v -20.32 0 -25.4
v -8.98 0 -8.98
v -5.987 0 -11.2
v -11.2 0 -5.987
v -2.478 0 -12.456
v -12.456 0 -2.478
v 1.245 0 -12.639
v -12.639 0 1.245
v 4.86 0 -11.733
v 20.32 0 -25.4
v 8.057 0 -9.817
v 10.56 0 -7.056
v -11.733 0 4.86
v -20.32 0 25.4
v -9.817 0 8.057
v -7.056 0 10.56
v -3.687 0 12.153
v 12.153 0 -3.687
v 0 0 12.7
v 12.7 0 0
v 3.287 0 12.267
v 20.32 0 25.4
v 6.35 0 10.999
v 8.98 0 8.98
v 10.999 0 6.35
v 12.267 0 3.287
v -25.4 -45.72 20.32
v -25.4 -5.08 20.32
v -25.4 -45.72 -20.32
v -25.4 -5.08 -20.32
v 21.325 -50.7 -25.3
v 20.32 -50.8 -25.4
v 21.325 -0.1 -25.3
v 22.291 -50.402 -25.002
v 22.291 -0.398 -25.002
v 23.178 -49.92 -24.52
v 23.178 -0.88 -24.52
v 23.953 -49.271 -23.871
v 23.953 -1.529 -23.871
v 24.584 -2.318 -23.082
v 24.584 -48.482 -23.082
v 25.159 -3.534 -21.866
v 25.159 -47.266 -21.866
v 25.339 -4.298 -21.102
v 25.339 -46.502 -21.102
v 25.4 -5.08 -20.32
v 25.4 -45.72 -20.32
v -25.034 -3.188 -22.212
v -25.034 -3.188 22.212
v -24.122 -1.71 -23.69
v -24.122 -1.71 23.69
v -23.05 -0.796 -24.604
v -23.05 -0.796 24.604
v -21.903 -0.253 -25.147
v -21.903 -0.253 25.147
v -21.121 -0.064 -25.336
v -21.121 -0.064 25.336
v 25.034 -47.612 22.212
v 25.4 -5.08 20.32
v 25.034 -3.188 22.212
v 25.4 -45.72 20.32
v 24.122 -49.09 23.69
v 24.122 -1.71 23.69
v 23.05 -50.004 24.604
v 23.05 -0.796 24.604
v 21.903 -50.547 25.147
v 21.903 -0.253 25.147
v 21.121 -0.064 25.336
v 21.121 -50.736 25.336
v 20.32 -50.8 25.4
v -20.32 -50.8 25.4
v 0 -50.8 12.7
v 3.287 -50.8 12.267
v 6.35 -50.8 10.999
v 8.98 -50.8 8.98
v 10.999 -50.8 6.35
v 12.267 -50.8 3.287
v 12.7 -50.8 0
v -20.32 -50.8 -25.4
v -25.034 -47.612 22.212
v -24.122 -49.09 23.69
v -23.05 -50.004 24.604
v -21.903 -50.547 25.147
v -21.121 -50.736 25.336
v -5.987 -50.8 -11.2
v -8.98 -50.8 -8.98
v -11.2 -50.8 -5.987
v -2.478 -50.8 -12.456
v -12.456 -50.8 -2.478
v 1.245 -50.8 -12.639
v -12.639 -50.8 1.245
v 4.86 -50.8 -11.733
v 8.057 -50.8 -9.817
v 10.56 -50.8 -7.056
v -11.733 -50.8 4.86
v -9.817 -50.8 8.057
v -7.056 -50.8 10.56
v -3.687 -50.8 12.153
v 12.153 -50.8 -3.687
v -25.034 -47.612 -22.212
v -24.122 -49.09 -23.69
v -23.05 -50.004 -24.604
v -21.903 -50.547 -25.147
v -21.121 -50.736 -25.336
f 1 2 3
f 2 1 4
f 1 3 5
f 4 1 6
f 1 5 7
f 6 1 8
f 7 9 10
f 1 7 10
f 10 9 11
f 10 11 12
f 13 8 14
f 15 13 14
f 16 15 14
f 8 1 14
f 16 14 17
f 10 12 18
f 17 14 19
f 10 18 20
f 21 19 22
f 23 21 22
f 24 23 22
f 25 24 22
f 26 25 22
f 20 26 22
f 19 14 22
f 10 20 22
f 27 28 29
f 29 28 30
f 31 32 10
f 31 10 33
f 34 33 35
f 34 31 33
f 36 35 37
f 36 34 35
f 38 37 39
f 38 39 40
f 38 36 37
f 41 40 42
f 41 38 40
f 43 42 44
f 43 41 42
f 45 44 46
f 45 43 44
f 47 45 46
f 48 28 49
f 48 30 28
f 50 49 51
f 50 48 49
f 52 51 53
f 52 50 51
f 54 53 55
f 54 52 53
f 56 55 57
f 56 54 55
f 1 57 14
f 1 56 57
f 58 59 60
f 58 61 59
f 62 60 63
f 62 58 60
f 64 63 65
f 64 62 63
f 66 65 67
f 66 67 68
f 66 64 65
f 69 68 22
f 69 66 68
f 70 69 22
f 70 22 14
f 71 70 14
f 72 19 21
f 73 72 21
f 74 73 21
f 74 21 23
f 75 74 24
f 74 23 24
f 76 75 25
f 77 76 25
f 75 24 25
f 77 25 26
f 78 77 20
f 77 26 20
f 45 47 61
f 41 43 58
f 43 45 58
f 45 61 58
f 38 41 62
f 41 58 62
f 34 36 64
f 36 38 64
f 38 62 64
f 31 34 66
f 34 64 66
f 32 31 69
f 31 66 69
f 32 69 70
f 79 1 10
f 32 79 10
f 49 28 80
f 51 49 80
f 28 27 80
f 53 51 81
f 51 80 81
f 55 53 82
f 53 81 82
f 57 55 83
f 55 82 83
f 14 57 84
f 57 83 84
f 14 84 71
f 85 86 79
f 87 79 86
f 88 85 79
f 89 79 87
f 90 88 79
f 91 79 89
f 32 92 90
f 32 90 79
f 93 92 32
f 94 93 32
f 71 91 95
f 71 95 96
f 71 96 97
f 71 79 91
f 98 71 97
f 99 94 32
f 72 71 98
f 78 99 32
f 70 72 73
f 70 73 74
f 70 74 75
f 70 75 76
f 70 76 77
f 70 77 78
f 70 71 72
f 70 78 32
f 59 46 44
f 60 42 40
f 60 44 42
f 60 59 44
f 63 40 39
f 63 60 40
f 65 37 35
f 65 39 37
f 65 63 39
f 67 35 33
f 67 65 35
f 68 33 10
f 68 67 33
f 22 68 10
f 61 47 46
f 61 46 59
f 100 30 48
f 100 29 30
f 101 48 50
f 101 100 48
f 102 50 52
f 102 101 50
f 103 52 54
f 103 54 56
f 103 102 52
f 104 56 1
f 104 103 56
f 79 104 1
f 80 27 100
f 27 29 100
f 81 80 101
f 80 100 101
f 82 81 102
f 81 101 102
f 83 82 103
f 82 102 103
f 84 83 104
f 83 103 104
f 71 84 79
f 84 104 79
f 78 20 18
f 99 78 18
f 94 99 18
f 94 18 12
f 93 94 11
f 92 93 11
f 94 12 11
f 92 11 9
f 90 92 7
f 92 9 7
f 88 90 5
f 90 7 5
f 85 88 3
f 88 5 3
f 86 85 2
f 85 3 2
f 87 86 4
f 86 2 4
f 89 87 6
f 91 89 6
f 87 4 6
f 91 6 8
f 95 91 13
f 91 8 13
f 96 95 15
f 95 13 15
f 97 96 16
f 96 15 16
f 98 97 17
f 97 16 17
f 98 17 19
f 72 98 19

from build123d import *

# Parameters (mm, degrees)
F1_DEPTH = 50.8
F3_R     = 5.08


# Not quite as in the source:
# - the program builds the solid bodies; features that only make, move or delete a surface that nothing else refers to are left out


with BuildPart() as f1:
    # F0 (on Front) → F1 (new body)
    with BuildSketch(Plane.XZ):
        with BuildLine():
            Line((25.4, 0), (12.7, 0))
            ThreePointArc((12.7, 0), (-8.9802561211, -8.9802561211), (0, 12.7))
            Line((0, 12.7), (0, 25.4))
            Line((0, 25.4), (-25.4, 25.4))
            Line((-25.4, 25.4), (-25.4, 0))
            Line((-25.4, 0), (-25.4, -25.4))
            Line((-25.4, -25.4), (0, -25.4))
            Line((0, -25.4), (25.4, -25.4))
            Line((25.4, -25.4), (25.4, 0))
        make_face()
        with BuildLine():
            ThreePointArc((0, 12.7), (8.9802561211, 8.9802561211), (12.7, 0))
            Line((12.7, 0), (25.4, 0))
            Line((25.4, 0), (25.4, 25.4))
            Line((25.4, 25.4), (0, 25.4))
            Line((0, 25.4), (0, 12.7))
        make_face()
    extrude(amount=F1_DEPTH)

    # F3
    f3_edges = [f1.edges().sort_by_distance(p)[0] for p in [
        (-25.4, -25.4, 25.4),
        (25.4, -25.4, 25.4),
        (-25.4, -25.4, -25.4),
        (25.4, -25.4, -25.4),
        (25.4, 0, 0),
        (-25.4, 0, 0),
        (-25.4, -50.8, 0),
        (25.4, -50.8, 0),
    ]]
    fillet(f3_edges, radius=F3_R)


solid = f1.part
